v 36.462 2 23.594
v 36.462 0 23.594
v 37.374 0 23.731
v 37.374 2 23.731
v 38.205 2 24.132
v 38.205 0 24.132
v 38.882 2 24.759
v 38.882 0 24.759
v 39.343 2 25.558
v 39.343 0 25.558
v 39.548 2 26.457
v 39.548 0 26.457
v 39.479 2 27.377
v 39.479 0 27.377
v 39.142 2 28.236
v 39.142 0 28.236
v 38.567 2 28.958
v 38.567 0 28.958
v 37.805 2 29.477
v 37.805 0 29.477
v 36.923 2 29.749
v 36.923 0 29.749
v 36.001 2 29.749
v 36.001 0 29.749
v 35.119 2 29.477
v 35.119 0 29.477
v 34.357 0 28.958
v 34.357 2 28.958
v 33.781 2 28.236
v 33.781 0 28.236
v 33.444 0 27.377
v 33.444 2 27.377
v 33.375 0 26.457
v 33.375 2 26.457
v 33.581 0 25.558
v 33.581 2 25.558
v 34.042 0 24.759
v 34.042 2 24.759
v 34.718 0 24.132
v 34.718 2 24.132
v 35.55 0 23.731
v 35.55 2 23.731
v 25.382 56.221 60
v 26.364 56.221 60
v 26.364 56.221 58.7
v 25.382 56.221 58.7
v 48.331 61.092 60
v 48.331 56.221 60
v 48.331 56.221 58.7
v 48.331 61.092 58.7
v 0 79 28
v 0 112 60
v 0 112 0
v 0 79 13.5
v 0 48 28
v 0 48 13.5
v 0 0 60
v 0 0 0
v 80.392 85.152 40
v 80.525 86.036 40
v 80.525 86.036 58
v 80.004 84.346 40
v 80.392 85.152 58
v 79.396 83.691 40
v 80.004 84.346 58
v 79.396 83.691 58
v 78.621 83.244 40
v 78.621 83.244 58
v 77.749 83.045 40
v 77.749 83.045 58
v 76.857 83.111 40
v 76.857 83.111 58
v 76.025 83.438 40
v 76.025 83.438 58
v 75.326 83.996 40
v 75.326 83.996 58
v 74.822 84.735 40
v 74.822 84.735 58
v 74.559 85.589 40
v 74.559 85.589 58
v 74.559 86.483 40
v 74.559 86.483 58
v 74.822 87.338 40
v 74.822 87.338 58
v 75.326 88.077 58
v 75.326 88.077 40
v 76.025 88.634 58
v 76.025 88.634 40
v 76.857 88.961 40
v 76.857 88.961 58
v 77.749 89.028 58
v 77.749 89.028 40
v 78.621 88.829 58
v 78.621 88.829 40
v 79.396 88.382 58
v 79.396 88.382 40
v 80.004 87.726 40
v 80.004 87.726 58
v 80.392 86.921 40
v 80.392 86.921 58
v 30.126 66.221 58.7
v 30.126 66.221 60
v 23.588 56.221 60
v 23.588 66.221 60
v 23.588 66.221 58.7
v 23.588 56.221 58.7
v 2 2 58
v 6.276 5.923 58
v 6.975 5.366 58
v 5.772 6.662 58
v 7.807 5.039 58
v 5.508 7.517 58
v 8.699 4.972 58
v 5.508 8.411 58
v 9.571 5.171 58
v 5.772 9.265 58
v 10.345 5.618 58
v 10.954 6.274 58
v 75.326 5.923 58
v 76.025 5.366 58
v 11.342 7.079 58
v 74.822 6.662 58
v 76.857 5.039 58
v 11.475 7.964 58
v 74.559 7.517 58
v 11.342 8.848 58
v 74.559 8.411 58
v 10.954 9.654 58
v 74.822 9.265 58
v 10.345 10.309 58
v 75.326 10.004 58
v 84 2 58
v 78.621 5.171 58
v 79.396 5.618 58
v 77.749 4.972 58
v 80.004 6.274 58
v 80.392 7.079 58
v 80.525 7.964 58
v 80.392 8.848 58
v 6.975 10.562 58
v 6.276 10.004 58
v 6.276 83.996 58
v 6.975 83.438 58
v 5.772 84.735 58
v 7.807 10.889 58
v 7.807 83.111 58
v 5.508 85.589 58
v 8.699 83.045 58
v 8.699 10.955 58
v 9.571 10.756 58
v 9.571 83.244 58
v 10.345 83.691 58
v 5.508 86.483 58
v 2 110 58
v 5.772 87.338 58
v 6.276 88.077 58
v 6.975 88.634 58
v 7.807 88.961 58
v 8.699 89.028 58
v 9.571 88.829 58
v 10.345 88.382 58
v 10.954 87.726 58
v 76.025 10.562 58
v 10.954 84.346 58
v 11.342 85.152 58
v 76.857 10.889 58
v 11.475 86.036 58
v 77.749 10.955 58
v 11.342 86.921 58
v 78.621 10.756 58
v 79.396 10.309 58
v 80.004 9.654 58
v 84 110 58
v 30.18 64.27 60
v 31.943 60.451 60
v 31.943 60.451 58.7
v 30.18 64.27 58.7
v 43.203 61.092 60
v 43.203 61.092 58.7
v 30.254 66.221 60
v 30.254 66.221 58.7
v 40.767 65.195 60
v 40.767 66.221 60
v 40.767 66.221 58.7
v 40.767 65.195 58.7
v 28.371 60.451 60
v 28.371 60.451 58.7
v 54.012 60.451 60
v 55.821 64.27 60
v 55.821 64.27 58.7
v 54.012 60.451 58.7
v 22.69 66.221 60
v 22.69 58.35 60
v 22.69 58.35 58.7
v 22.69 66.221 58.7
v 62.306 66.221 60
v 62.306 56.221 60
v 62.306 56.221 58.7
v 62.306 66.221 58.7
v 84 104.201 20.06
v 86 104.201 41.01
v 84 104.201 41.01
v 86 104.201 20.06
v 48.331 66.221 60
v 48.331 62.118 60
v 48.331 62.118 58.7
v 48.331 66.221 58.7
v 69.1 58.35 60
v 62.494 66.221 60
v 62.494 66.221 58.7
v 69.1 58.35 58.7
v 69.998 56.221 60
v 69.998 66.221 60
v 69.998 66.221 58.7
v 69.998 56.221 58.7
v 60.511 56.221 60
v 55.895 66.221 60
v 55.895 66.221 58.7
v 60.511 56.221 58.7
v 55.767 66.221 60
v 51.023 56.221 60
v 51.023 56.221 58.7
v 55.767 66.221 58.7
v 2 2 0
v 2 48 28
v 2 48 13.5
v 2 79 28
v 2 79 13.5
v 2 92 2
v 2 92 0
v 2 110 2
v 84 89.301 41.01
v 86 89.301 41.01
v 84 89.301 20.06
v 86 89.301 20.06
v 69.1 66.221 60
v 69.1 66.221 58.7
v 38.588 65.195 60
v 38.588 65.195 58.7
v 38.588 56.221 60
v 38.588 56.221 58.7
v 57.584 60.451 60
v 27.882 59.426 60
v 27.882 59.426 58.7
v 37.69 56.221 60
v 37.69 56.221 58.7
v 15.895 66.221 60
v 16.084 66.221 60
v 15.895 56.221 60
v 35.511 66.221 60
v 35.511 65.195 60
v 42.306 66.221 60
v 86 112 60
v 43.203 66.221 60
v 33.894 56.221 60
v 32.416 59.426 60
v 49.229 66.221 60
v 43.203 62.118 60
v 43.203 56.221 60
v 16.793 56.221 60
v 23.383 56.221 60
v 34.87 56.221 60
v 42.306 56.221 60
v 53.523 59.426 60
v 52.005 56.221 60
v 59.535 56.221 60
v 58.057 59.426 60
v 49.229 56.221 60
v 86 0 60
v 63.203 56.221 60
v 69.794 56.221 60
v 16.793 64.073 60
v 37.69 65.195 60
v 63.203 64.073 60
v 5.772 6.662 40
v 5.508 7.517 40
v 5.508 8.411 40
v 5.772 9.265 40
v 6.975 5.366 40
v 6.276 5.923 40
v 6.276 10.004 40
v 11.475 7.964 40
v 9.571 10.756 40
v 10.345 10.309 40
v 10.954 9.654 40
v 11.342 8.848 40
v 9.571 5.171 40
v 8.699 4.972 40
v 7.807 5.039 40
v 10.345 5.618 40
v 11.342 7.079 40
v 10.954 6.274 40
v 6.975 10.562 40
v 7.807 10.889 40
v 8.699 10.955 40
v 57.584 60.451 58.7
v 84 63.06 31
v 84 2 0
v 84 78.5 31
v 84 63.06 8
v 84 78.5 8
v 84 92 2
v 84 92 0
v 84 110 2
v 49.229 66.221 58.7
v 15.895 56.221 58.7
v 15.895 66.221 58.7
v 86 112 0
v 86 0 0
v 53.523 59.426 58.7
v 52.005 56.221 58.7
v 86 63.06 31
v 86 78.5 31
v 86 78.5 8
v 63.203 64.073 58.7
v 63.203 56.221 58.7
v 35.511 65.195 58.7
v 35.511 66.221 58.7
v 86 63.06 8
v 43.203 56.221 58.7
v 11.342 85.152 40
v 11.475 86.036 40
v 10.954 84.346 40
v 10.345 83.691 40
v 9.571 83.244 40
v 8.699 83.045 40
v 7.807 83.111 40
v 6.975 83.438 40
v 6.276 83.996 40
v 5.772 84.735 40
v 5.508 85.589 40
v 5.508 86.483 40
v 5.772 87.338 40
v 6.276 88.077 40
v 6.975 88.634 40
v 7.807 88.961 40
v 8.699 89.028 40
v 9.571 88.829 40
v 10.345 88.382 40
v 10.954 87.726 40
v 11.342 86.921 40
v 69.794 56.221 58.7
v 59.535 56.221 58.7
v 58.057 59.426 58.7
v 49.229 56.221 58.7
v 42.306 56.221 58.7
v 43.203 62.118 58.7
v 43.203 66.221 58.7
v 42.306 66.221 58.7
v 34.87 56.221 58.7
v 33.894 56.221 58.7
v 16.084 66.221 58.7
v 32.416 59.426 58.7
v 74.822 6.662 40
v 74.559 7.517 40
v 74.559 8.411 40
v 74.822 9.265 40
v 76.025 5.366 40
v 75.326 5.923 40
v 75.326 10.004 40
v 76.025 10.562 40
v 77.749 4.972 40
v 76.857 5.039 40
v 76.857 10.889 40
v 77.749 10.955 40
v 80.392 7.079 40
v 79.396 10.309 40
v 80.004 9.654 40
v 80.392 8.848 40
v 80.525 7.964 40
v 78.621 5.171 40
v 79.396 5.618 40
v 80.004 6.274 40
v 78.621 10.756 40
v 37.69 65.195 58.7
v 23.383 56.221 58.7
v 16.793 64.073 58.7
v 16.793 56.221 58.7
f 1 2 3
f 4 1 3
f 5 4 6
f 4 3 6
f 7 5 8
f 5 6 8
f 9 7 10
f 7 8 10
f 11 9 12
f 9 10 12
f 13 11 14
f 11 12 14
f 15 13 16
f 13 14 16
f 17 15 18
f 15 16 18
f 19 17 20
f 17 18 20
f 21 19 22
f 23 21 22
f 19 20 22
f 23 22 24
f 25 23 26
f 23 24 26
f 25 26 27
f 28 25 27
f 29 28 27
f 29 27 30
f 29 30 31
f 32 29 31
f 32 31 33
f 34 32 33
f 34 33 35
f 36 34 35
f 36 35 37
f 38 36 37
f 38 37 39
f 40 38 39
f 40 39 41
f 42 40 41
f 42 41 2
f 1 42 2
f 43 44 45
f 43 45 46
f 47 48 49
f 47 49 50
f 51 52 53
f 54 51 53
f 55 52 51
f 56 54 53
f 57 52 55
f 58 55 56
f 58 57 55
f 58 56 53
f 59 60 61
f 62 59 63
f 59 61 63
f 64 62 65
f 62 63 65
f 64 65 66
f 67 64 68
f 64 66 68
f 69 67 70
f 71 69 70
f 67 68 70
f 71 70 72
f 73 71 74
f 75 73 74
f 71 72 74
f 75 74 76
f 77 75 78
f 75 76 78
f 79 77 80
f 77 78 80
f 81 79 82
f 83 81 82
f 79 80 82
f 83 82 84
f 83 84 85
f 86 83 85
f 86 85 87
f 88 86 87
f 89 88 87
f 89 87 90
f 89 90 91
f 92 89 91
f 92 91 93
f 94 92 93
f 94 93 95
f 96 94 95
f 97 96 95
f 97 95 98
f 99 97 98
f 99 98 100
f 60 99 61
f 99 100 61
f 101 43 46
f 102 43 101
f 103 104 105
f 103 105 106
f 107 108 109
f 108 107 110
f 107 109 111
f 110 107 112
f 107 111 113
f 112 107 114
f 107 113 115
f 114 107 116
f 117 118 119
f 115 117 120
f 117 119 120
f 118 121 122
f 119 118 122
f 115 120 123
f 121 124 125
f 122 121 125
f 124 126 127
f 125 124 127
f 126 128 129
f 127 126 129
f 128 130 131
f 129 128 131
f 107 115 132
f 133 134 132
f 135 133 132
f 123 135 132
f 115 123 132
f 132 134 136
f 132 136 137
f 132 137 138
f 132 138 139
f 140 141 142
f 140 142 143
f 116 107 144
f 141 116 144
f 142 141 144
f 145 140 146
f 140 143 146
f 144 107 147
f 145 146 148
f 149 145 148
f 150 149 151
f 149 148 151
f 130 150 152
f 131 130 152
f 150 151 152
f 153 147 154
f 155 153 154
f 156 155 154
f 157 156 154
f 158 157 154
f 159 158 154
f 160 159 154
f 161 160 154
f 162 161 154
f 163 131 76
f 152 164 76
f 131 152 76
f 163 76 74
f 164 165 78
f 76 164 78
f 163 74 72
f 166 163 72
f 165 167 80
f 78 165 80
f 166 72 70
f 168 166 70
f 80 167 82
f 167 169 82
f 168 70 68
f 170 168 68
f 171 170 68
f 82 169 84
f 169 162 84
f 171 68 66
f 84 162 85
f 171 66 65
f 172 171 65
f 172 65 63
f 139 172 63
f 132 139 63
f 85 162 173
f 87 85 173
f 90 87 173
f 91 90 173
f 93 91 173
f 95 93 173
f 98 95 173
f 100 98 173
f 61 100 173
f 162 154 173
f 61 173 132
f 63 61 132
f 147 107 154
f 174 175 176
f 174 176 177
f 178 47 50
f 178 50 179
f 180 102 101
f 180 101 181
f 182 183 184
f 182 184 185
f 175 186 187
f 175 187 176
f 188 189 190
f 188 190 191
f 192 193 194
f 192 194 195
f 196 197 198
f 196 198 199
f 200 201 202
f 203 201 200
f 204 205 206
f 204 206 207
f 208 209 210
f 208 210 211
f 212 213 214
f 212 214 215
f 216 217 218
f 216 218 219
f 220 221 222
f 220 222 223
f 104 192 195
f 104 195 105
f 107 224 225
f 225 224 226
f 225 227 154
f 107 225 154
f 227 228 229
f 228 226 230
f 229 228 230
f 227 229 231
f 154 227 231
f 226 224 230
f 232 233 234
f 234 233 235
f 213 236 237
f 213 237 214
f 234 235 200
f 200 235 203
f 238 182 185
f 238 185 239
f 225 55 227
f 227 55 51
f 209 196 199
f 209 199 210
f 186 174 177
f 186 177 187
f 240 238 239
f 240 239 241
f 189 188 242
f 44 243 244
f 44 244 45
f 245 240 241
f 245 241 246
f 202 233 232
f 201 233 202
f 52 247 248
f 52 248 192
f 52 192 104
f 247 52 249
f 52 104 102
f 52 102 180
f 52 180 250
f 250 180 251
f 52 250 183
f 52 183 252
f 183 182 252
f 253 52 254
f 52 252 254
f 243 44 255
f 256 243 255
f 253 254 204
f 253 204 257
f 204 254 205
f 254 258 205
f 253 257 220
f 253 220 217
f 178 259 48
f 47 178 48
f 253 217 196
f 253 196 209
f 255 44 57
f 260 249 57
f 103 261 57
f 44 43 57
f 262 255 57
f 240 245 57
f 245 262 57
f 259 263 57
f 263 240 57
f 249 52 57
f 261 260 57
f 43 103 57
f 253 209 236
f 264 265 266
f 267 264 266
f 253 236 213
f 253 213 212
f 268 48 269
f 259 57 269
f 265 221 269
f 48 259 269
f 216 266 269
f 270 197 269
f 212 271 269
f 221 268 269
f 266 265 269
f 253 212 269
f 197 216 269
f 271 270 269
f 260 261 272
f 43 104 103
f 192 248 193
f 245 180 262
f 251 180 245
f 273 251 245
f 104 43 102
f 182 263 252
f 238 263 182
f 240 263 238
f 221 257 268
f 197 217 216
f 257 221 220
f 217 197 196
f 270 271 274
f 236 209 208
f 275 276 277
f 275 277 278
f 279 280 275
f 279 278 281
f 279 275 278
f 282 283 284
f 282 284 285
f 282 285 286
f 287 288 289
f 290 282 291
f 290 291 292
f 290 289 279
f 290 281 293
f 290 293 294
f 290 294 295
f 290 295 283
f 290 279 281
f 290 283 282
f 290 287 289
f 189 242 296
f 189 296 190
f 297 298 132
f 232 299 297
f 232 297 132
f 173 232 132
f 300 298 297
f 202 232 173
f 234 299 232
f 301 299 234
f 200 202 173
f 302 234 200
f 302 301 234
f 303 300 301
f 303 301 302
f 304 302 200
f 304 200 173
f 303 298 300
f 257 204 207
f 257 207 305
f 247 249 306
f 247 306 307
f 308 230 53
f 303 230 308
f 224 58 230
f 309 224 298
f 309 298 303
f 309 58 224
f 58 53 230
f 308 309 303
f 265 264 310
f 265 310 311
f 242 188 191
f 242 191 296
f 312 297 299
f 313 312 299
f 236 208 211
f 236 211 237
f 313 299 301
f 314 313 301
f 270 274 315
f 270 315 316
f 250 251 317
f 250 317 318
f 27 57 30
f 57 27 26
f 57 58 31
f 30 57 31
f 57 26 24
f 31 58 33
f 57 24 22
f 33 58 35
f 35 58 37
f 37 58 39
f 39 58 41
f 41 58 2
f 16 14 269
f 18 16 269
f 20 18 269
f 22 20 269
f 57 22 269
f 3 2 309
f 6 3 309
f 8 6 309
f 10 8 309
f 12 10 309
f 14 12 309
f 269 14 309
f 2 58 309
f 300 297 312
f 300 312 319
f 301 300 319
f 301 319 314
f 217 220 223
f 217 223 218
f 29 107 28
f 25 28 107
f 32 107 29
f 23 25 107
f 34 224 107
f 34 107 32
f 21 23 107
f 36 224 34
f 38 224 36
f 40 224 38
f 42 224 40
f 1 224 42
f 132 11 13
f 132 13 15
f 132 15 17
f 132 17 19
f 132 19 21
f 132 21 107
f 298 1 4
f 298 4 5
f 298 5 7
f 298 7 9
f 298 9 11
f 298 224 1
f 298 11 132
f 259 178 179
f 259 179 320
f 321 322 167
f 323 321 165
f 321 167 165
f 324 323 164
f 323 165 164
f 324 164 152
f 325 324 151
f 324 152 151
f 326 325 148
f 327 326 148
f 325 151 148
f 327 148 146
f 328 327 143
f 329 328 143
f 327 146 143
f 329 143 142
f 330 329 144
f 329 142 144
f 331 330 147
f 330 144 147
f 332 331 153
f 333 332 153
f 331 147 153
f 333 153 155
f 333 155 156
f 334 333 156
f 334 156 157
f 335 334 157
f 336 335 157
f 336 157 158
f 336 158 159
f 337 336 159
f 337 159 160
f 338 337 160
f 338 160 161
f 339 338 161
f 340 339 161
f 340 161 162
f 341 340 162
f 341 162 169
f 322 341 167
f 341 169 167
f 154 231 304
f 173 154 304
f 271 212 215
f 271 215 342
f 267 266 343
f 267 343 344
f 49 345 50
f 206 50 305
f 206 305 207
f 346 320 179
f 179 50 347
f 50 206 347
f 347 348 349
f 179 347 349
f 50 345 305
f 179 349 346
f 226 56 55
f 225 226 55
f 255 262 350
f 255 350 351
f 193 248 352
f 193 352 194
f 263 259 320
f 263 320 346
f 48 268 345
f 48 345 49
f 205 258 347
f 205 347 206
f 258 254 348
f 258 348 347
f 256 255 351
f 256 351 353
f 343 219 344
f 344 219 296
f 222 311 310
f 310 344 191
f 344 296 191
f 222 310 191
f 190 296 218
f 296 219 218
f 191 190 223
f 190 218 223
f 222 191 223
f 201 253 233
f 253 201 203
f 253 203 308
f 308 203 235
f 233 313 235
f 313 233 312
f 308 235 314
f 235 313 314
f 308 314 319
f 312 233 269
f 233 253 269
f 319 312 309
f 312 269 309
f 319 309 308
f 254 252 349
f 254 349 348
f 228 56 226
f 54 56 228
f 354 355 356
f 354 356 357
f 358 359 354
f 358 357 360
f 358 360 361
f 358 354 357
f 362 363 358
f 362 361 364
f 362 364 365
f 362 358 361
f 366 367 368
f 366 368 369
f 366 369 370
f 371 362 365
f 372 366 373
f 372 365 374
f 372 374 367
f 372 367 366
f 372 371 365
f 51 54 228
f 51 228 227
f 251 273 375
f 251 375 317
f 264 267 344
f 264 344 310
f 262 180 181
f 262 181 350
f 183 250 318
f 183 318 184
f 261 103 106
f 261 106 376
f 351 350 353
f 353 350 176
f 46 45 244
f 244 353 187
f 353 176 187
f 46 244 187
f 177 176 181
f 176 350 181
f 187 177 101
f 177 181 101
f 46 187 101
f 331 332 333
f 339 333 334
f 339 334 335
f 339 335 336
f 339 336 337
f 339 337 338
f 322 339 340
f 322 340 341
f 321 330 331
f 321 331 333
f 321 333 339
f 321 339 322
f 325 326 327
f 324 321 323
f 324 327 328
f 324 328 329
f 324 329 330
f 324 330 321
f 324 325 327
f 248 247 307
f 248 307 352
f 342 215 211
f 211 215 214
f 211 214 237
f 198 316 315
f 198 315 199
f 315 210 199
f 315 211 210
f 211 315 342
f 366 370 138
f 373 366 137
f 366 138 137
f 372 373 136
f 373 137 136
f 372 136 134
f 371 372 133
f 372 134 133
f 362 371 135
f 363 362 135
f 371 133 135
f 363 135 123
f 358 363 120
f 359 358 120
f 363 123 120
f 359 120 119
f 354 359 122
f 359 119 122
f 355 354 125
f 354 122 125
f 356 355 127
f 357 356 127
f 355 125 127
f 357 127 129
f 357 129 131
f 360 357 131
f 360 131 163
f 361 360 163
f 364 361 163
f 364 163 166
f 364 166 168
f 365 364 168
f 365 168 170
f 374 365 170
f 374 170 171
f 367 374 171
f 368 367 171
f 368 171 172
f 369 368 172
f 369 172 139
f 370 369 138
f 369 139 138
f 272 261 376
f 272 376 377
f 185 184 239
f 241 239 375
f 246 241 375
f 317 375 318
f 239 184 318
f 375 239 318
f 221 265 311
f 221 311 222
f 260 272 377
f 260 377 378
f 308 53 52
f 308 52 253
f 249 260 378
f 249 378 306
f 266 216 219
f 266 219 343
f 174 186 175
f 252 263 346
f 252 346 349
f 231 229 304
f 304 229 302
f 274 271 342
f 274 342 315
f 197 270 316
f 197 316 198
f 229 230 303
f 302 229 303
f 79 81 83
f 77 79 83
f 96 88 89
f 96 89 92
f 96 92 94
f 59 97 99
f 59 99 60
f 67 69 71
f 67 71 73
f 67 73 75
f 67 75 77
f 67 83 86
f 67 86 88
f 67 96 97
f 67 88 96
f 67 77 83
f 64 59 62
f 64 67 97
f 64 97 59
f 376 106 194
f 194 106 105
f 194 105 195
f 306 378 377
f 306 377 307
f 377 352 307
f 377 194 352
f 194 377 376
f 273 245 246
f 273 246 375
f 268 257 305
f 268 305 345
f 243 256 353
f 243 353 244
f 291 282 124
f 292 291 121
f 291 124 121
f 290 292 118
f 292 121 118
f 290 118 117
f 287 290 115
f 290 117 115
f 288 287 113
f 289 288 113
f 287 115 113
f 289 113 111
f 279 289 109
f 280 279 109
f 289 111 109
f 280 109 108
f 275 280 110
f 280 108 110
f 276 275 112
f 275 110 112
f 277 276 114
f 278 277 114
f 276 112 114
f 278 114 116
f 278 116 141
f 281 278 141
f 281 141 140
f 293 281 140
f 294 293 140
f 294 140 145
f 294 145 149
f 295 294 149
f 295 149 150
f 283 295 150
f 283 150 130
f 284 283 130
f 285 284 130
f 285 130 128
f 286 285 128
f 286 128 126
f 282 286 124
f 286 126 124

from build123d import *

# Parameters (mm, degrees)
ESQUISSE1_W                  = 86
ESQUISSE1_H                  = 94
BOSS_EXTRU_1_DEPTH           = 60
ESQUISSE2_W                  = 82
ESQUISSE2_H                  = 90
ENL_V_MAT_EXTRU_1_DEPTH      = 58
ESQUISSE3_W                  = 86
ESQUISSE3_H                  = 60
BOSS_EXTRU_2_DEPTH           = 18
ESQUISSE5_W                  = 82
ESQUISSE5_H                  = 56
ENL_V_MAT_EXTRU_2_DEPTH      = 18
ENL_V_MAT_EXTRU_3_DEPTH      = 154.427507312
ENL_V_MAT_EXTRU_3_DEPTH_BACK = 18
ESQUISSE7_W                  = 23
ESQUISSE7_H                  = 15.44
ESQUISSE8_W                  = 14.5
ESQUISSE8_H                  = 31
ENL_V_MAT_EXTRU_4_DEPTH      = 18
ESQUISSE11_W                 = 20.95
ESQUISSE11_H                 = 14.9
ENL_V_MAT_EXTRU_5_DEPTH      = 18
ESQUISSE12_R                 = 3.095
ENL_V_MAT_EXTRU_6_DEPTH      = 18
ESQUISSE15_R                 = 3
BOSS_EXTRU_3_DEPTH           = 18
ENL_V_MAT_EXTRU_7_DEPTH      = 1.3


with BuildPart() as part:
    # Esquisse1 → Boss.-Extru.1 (new body)
    with BuildSketch(Plane.XY):
        with Locations((43, 47)):
            Rectangle(ESQUISSE1_W, ESQUISSE1_H)
    extrude(amount=BOSS_EXTRU_1_DEPTH)

    # Esquisse2 → Enlèv. mat.-Extru.1 (cut)
    with BuildSketch(Plane.XY):
        with Locations((43, 47)):
            Rectangle(ESQUISSE2_W, ESQUISSE2_H)
    extrude(amount=ENL_V_MAT_EXTRU_1_DEPTH, mode=Mode.SUBTRACT)

    # Esquisse3 → Boss.-Extru.2 (add)
    with BuildSketch(Plane(origin=(0, 94, 0), x_dir=(1, 0, 0), z_dir=(0, 1, 0))):
        with Locations((43, -30)):
            Rectangle(ESQUISSE3_W, ESQUISSE3_H)
    extrude(amount=BOSS_EXTRU_2_DEPTH)

    # Esquisse5 → Enlèv. mat.-Extru.2 (cut)
    with BuildSketch(Plane(origin=(0, 92, 0), x_dir=(1, 0, 0), z_dir=(0, 1, 0))):
        with Locations((43, -30)):
            Rectangle(ESQUISSE5_W, ESQUISSE5_H)
    extrude(amount=ENL_V_MAT_EXTRU_2_DEPTH, mode=Mode.SUBTRACT)

    # Esquisse7 → Enlèv. mat.-Extru.3 (cut, two sides: drawn at the far end of the back side and taken through both)
    with BuildSketch(Plane(origin=(86, 0, 0), x_dir=(0, 0, -1), z_dir=(1, 0, 0)).offset(-ENL_V_MAT_EXTRU_3_DEPTH_BACK)):
        with Locations((-19.5, 70.77985545)):
            Rectangle(ESQUISSE7_W, ESQUISSE7_H)
    extrude(amount=ENL_V_MAT_EXTRU_3_DEPTH + ENL_V_MAT_EXTRU_3_DEPTH_BACK, mode=Mode.SUBTRACT)

    # Esquisse8 → Enlèv. mat.-Extru.4 (cut)
    with BuildSketch(Plane.ZY):
        with Locations((20.75, 63.5)):
            Rectangle(ESQUISSE8_W, ESQUISSE8_H)
    extrude(amount=-ENL_V_MAT_EXTRU_4_DEPTH, mode=Mode.SUBTRACT)

    # Esquisse11 → Enlèv. mat.-Extru.5 (cut)
    with BuildSketch(Plane(origin=(86, 0, 0), x_dir=(0, 0, -1), z_dir=(1, 0, 0))):
        with Locations((-30.534625058, 96.750653673)):
            Rectangle(ESQUISSE11_W, ESQUISSE11_H)
    extrude(amount=-ENL_V_MAT_EXTRU_5_DEPTH, mode=Mode.SUBTRACT)

    # Esquisse12 → Enlèv. mat.-Extru.6 (cut)
    with BuildSketch(Plane.XZ):
        with Locations(Location((36.461804468, 26.688728835, 0), (0, 0, 270))):
            Circle(ESQUISSE12_R)
    extrude(amount=-ENL_V_MAT_EXTRU_6_DEPTH, mode=Mode.SUBTRACT)

    # Esquisse15 → Boss.-Extru.3 (add)
    with BuildSketch(Plane(origin=(0, 0, 58), x_dir=(-1, 0, 0), z_dir=(0, 0, -1))):
        with Locations(Location((-77.525036721, 7.963761202, 0), (0, 0, 180))):
            Circle(ESQUISSE15_R)
        with Locations(Location((-8.474963279, 7.963761202, 0), (0, 0, 180))):
            Circle(ESQUISSE15_R)
        with Locations(Location((-77.525036721, 86.036238798, 0), (0, 0, 180))):
            Circle(ESQUISSE15_R)
        with Locations(Location((-8.474963279, 86.036238798, 0), (0, 0, 180))):
            Circle(ESQUISSE15_R)
    extrude(amount=BOSS_EXTRU_3_DEPTH)

    # Esquisse16 → Enlèv. mat.-Extru.7 (cut)
    # profile 1 of 6: a face of its own
    with BuildSketch(Plane.XY.offset(60)):
        Polygon((15.8952664, 56.22062268), (15.8952664, 66.22062268), (16.083567682, 66.22062268), (22.690138195, 58.350029732), (22.690138195, 66.22062268), (23.587574092, 66.22062268), (23.587574092, 56.22062268), (23.383247169, 56.22062268), (16.792702297, 64.073186783), (16.792702297, 56.22062268), align=None)
    # profile 2 of 6: a face of its own
    with BuildSketch(Plane.XY.offset(60)):
        Polygon((30.254240759, 66.22062268), (34.869625374, 56.22062268), (33.894064477, 56.22062268), (32.415699092, 59.425750886), (27.882445887, 59.425750886), (26.3640164, 56.22062268), (25.382445887, 56.22062268), (30.126035631, 66.22062268), align=None)
        Polygon((30.180122169, 64.269500886), (28.371227939, 60.451391911), (31.942942682, 60.451391911), align=None, mode=Mode.SUBTRACT)
    # profile 3 of 6: a face of its own
    with BuildSketch(Plane.XY.offset(60)):
        Polygon((35.510651015, 65.194981655), (35.510651015, 66.22062268), (40.767061272, 66.22062268), (40.767061272, 65.194981655), (38.587574092, 65.194981655), (38.587574092, 56.22062268), (37.690138195, 56.22062268), (37.690138195, 65.194981655), align=None)
    # profile 4 of 6: a face of its own
    with BuildSketch(Plane.XY.offset(60)):
        Polygon((42.30552281, 66.22062268), (43.202958708, 66.22062268), (43.202958708, 62.118058578), (48.331163836, 62.118058578), (48.331163836, 66.22062268), (49.228599733, 66.22062268), (49.228599733, 56.22062268), (48.331163836, 56.22062268), (48.331163836, 61.092417552), (43.202958708, 61.092417552), (43.202958708, 56.22062268), (42.30552281, 56.22062268), align=None)
    # profile 5 of 6: a face of its own
    with BuildSketch(Plane.XY.offset(60)):
        Polygon((55.8952664, 66.22062268), (60.510651015, 56.22062268), (59.535090118, 56.22062268), (58.056724733, 59.425750886), (53.523471528, 59.425750886), (52.005042041, 56.22062268), (51.023471528, 56.22062268), (55.767061272, 66.22062268), align=None)
        Polygon((55.82114781, 64.269500886), (54.01225358, 60.451391911), (57.583968323, 60.451391911), align=None, mode=Mode.SUBTRACT)
    # profile 6 of 6: a face of its own
    with BuildSketch(Plane.XY.offset(60)):
        Polygon((62.30552281, 56.22062268), (62.30552281, 66.22062268), (62.493824092, 66.22062268), (69.100394605, 58.350029732), (69.100394605, 66.22062268), (69.997830503, 66.22062268), (69.997830503, 56.22062268), (69.79350358, 56.22062268), (63.202958708, 64.073186783), (63.202958708, 56.22062268), align=None)
    extrude(amount=-ENL_V_MAT_EXTRU_7_DEPTH, mode=Mode.SUBTRACT)


solid = part.part
